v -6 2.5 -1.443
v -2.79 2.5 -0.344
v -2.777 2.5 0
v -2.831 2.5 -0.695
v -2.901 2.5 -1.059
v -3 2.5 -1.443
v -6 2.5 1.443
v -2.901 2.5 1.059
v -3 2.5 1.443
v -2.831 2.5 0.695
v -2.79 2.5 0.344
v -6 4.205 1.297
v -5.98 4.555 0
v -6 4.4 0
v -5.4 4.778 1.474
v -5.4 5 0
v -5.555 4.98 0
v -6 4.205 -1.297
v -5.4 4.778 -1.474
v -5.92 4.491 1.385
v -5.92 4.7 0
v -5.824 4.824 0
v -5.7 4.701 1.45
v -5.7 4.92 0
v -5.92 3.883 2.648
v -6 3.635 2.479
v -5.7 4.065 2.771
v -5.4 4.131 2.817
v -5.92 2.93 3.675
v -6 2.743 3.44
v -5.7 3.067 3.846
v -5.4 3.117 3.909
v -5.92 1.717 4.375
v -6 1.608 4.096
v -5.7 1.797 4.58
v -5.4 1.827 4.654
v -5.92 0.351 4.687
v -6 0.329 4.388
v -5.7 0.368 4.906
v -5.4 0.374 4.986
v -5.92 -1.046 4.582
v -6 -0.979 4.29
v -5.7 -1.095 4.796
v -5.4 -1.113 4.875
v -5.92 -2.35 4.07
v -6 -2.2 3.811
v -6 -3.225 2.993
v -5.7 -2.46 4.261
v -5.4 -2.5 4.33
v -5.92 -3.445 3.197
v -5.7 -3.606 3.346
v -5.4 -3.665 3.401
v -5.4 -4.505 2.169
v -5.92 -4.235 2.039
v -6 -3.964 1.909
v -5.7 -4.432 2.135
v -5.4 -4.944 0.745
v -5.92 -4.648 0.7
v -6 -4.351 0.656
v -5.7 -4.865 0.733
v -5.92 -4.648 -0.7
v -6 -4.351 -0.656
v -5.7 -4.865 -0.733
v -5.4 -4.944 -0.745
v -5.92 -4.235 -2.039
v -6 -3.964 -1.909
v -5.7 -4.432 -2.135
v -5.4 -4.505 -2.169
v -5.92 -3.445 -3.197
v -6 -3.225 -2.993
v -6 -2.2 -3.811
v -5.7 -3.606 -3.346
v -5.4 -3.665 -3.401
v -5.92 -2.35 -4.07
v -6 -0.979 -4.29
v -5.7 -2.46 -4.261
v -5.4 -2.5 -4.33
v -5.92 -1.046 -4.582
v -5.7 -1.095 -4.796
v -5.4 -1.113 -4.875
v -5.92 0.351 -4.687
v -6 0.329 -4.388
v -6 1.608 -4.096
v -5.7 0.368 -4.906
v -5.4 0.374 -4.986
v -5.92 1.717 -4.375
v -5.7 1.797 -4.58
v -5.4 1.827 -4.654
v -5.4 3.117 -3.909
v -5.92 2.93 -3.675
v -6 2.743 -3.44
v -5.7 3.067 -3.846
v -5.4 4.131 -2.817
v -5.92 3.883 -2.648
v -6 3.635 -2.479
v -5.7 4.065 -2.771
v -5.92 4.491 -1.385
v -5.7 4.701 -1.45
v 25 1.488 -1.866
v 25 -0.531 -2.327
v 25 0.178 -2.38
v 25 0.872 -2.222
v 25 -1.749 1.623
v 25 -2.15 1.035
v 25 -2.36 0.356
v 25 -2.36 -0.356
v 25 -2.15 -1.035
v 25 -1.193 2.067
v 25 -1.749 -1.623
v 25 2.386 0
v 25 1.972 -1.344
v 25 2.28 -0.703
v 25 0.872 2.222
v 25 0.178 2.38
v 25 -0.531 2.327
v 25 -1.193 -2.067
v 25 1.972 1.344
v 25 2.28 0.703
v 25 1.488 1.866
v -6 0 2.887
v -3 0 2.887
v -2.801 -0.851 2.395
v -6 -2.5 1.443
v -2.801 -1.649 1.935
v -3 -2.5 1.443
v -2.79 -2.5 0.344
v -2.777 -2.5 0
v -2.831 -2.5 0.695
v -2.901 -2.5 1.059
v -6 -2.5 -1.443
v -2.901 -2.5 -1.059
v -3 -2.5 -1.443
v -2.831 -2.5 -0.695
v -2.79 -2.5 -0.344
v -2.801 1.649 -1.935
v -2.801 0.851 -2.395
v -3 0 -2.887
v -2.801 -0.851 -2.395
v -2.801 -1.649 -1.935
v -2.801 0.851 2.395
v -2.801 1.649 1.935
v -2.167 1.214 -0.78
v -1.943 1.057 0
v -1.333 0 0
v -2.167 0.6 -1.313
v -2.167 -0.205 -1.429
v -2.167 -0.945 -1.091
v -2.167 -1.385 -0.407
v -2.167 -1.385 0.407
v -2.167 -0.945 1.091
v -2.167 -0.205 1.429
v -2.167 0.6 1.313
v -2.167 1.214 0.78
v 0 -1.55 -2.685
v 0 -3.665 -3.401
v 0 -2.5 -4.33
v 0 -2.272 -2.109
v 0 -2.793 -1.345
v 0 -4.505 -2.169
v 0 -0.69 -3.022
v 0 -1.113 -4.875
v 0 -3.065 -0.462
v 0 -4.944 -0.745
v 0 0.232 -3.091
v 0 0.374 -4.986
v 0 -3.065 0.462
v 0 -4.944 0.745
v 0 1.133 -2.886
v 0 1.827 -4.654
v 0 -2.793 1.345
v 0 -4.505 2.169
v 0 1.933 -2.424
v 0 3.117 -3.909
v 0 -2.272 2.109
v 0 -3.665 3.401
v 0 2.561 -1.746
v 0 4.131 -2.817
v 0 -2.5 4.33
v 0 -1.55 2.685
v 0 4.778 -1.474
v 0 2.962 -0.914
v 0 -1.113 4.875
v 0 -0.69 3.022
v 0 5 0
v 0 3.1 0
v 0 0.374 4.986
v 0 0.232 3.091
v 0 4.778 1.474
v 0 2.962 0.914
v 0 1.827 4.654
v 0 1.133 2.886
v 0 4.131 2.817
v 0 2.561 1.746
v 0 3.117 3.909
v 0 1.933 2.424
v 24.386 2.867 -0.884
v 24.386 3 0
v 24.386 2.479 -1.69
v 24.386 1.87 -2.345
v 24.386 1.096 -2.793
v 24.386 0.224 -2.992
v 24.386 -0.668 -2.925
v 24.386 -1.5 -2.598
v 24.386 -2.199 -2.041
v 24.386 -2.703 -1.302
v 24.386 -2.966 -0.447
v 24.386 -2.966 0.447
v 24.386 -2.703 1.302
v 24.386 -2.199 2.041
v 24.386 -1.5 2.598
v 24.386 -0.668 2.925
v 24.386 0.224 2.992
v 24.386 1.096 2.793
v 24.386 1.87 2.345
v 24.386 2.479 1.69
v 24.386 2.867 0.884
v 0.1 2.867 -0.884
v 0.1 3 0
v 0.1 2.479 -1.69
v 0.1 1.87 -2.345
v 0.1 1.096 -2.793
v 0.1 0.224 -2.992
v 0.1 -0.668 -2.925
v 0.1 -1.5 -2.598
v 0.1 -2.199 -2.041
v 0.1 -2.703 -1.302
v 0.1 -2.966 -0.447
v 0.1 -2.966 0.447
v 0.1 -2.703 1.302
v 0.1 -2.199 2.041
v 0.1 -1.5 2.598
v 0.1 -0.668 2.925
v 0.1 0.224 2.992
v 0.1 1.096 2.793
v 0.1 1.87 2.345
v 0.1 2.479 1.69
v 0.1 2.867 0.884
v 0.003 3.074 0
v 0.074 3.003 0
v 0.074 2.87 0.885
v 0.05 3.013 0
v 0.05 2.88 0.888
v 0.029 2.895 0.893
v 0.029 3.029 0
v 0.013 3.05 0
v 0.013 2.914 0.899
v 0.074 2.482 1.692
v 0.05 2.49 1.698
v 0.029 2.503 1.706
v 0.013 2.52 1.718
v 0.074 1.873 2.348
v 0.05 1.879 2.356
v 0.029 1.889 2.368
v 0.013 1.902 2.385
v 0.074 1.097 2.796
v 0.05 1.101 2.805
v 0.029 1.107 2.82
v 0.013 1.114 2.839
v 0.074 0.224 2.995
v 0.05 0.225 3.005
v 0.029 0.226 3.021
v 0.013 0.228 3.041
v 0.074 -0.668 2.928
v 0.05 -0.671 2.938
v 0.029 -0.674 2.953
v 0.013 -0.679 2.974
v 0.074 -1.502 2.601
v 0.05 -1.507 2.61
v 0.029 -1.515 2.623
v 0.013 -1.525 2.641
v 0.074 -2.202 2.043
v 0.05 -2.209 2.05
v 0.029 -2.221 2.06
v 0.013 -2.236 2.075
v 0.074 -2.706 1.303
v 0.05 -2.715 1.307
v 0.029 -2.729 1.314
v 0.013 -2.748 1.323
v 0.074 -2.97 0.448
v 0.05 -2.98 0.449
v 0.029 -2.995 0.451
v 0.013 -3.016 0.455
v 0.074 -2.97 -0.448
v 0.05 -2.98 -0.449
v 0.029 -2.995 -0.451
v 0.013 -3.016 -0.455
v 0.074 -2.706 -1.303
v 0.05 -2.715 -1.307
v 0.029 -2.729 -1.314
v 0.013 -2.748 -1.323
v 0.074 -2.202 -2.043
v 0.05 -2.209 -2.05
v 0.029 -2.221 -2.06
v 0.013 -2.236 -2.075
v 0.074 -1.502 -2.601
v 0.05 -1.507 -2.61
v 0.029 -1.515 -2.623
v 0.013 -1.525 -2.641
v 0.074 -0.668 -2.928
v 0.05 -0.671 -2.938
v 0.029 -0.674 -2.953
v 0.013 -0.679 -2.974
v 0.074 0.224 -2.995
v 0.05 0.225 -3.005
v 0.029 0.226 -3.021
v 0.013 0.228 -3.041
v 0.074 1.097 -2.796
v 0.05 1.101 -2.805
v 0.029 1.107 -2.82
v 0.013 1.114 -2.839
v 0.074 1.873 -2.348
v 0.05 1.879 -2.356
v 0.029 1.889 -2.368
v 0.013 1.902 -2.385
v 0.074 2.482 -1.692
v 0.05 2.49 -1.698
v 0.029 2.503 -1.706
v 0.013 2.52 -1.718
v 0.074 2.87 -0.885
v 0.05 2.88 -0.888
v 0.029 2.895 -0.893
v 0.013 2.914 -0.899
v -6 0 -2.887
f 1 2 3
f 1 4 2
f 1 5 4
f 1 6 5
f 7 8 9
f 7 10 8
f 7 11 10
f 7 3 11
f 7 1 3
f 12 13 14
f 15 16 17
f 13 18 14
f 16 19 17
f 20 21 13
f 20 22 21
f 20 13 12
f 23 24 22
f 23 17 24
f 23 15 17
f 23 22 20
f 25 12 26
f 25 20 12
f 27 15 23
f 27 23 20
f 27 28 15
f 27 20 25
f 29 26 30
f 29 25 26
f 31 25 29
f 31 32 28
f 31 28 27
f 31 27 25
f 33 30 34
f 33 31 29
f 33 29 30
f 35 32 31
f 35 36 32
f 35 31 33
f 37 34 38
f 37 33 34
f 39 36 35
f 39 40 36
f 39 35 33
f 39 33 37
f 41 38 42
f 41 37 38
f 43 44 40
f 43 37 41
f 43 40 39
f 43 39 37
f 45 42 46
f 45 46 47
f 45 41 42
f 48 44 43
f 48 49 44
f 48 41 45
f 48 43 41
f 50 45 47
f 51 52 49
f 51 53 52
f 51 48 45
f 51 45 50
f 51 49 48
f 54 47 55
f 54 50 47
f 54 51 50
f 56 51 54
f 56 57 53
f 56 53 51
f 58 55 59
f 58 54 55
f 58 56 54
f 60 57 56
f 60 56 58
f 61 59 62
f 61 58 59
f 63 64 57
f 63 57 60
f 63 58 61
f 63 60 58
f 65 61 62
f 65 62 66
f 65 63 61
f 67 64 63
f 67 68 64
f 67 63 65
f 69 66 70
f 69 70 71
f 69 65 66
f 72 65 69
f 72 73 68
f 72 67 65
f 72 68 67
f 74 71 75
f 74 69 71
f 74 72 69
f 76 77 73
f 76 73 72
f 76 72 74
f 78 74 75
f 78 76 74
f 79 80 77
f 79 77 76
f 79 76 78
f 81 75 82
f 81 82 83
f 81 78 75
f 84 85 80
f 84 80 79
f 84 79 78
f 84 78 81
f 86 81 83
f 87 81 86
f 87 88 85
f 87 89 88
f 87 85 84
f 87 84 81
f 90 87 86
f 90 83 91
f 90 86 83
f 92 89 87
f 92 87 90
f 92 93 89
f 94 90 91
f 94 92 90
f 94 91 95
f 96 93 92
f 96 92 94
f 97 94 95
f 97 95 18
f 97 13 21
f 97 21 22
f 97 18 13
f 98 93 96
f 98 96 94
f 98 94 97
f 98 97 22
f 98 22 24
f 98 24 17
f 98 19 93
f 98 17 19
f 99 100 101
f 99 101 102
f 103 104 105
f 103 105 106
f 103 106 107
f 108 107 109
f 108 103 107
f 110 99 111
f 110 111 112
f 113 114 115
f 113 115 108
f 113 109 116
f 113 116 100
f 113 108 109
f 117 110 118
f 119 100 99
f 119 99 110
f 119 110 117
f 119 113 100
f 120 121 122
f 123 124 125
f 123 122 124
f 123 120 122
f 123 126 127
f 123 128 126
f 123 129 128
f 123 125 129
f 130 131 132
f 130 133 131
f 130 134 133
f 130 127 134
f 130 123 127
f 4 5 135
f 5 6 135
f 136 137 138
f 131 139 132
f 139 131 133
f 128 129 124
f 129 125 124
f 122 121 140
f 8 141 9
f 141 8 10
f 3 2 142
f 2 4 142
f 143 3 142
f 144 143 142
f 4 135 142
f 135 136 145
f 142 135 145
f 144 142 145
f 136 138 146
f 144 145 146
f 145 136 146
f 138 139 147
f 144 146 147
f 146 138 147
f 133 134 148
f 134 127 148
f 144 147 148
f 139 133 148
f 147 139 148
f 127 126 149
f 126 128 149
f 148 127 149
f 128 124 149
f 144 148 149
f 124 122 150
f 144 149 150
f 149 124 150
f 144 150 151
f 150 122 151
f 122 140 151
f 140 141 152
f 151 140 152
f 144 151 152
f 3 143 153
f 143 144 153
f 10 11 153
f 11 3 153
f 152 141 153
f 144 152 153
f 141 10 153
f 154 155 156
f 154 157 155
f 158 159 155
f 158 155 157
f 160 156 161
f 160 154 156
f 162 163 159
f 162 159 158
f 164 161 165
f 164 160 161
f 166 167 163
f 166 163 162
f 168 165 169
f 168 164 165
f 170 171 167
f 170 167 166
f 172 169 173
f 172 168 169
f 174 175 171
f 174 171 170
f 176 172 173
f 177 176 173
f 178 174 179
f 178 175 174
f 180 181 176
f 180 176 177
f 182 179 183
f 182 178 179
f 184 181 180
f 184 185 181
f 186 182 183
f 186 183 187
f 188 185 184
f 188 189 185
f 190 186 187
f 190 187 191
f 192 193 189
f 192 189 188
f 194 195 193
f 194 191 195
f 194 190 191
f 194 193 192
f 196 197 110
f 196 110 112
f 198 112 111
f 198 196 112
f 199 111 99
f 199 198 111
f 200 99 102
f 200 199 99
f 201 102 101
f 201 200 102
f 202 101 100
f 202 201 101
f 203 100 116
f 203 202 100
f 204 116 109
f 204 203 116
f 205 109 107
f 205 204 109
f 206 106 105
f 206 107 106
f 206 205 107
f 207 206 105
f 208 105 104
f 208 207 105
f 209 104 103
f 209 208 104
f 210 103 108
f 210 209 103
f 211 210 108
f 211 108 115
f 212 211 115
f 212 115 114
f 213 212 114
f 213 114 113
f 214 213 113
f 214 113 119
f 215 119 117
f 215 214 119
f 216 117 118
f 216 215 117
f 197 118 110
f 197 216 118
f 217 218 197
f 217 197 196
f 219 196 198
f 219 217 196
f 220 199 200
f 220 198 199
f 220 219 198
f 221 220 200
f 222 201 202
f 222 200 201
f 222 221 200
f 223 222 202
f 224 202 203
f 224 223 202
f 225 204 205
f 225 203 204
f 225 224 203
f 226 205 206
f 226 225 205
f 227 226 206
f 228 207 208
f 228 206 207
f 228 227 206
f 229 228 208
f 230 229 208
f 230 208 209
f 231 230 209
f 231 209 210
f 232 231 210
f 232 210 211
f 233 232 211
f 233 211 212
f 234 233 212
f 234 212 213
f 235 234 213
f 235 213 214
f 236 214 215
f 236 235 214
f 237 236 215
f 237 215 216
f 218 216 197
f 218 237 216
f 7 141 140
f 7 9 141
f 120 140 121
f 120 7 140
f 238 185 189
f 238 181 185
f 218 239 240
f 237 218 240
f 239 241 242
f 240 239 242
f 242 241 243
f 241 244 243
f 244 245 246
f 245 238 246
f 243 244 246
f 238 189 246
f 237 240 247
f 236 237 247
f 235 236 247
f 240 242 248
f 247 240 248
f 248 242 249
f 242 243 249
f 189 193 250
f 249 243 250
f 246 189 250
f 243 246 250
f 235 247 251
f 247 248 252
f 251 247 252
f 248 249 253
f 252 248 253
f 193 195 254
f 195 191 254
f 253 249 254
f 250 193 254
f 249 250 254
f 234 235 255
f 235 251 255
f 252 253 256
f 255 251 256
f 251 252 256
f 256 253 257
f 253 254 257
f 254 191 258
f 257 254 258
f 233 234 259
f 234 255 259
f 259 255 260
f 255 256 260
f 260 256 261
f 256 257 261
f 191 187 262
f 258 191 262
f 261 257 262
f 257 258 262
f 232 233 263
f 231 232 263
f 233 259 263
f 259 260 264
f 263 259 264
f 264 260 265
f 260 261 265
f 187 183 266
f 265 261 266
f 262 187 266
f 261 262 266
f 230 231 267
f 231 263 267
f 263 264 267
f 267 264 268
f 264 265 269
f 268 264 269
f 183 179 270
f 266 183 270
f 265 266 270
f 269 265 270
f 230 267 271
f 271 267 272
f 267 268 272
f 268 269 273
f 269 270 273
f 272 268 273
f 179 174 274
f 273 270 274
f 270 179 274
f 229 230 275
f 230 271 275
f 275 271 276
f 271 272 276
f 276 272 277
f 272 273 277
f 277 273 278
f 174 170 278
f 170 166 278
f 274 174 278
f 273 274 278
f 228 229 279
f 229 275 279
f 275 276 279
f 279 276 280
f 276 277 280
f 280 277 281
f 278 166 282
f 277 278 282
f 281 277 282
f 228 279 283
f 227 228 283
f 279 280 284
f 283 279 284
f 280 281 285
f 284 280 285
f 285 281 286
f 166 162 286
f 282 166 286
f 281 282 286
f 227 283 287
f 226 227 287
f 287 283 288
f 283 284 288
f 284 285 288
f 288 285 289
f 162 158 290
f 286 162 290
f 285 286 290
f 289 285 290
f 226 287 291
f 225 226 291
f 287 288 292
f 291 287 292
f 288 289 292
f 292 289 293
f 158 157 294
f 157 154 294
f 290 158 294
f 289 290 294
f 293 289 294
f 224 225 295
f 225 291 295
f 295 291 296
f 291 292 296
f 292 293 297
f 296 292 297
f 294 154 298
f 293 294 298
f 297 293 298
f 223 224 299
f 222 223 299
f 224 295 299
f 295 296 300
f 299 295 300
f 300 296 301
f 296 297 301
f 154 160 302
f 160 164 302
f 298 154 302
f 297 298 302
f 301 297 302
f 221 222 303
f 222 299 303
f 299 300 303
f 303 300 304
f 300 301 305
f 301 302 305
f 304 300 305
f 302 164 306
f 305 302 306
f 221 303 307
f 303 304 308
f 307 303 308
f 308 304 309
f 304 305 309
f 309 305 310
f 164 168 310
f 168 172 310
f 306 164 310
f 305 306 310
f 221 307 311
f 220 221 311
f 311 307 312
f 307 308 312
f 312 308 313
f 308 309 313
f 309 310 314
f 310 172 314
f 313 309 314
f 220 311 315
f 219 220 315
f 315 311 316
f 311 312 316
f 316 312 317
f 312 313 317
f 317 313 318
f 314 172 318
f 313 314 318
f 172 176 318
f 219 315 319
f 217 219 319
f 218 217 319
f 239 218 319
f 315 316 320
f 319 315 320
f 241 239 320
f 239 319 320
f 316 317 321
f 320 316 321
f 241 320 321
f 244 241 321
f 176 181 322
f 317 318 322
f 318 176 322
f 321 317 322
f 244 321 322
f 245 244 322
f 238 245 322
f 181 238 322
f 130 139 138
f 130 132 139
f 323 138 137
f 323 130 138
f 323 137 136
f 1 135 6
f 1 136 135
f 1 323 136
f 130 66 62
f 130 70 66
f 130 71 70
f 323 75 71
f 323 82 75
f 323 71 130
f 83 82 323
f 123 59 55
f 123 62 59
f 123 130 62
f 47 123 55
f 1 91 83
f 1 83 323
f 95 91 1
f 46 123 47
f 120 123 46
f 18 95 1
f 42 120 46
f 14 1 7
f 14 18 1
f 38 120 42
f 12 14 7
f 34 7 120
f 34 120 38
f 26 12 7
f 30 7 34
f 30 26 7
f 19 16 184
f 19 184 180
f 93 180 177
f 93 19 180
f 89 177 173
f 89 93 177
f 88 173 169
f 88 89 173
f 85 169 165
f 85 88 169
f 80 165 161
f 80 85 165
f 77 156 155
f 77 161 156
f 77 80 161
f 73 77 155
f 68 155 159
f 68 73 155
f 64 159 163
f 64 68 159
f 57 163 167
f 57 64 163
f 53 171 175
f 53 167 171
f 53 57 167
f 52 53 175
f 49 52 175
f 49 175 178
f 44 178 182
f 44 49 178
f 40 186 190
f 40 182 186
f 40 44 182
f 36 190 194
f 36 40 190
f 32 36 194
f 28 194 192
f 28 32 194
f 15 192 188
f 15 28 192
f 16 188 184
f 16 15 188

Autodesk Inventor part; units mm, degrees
ref_plane "YZ Plane" through (0, 0, 0) normal (1, 0, 0) x (0, 1, 0)
ref_plane "XZ Plane" through (0, 0, 0) normal (0, 1, 0) x (-1, 0, 0)
sketch "Szkic1" plane through (0, 0, 0) normal (0, 0, 1) x (1, 0, 0)
  line L0 (-1.3333, 0) -> (25, 0)
  line L1 (25, 0) -> (25, 3)
  line L2 (25, 3) -> (3, 3)
  line L3 (3, 3) -> (2.3864, 3)
  line L4 (2.3864, 3) -> (0, 3)
  line L5 (0, 3) -> (0, 5)
  line L6 (0, 5) -> (-6, 5)
  line L7 (-6, 5) -> (-6, 2.8868)
  line L8 (-6, 2.8868) -> (-3, 2.8868)
  line L9 (-3, 2.8868) -> (-1.3333, 0)
  line L10 (-12.2, 0) -> (31.2, 0) projected
  line L11 (0, -1) -> (0, 6) projected
  line L12 (3, 3) -> (0, 3) construction
  dimension "d1" = 22
  dimension "d2" = 0.6136
  dimension "d3" = 6
  dimension "d4" = 3
  dimension "d5" = 60
  dimension "d6" = 6
  dimension "d7" = 6
  dimension "d8" = 5.7735
  dimension "d9" = 10
  dimension "d26" = 25
revolve "Bryła" add sketch "Szkic1" angle 360 about axis through (-1.3333, 0, 0) along (1, 0, 0)
sketch "Szkic2" plane through (-6, 0, 0) normal (-1, 0, 0) x (0, 0, 1)
  circle A0 centre (0, 0) radius 2.8868 projected
  line L0 (0, -7) -> (0, 7) projected
  line L1 (-7, 0) -> (7, 0) projected
  line L2 (2.8868, 0) -> (1.4434, -2.5)
  line L3 (1.4434, -2.5) -> (-1.4434, -2.5)
  line L4 (-1.4434, -2.5) -> (-2.8868, 0)
  line L5 (-2.8868, 0) -> (-1.4434, 2.5)
  line L6 (-1.4434, 2.5) -> (1.4434, 2.5)
  line L7 (1.4434, 2.5) -> (2.8868, 0)
extrude "Szczelina" add sketch "Szkic2" against normal up to next contours L7 A0 | A0 L2 | L6 L0 A0 | A0 L0 L3 | L0 L6 A0 | A0 L3 L0 | L4 A0 | A0 L5
fillet "Zaokrąglenie1" radius 0.6 1 edges at (-6, -5, 0)
thread "Gwint" size "M6x1" class "6g" standard "ISO Metric profile" length 22
chamfer "Faza1" distance 0.6135 distance2 0.6135 1 edges at (25, -3, 0) measured on face at (25, -0.5681, -0.823)
ref_plane "Work Plane1" through (29, 0, 0) normal (0, -1, 0) x (1, 0, 0)
fillet "Fillet2" radius 0.1 1 edges at (0, -3, 0)
equation "\"d1\" = GEL"
equation "\"d3\" = KOH"
equation "\"d4\" = INTI"
equation "\"d6\" = GD"
equation "\"d7\" = BDM"
equation "\"d8\" = 1.1547 * SW"
equation "\"d9\" = KOD"
equation "\"d26\" = NLG"
equation "\"d30\" = R"
equation "\"d17\" = RR"
equation "\"d13\" = GEL"
equation "\"d15\" = -0.5 * SPD + 0.5 * GD"
equation "\"d16\" = GUL"
equation "\"GD\" = 6"
equation "\"NLG\" = 25"
equation "\"GEL\" = 22"
equation "\"KOD\" = 10"
equation "\"KOH\" = 6"
equation "\"INTI\" = 3"
equation "\"GAL\" = 0.61345 * PTC"
equation "\"GUL\" = 0.61345 * PTC"
equation "\"BDM\" = NND"
equation "\"SW\" = 5"
equation "\"RR\" = 0.6"
equation "\"SPD\" = NND - 1.2269 * PTC"
equation "\"R\" = 0.1"
equation "\"TOA\" = 30deg"
equation "\"GD1\" = THREADDIA - 1.2269 * PTC"
equation "\"THREADDIA\" = 6"
equation "\"FAWI\" = 45deg"
equation "\"PTC\" = 1"
equation "\"NND\" = 6"
equation "\"E0\" = 1.155 * SW"
properties part number "ISO 4762  - M6 x 25" material "Stal nierdzewna 440C"
